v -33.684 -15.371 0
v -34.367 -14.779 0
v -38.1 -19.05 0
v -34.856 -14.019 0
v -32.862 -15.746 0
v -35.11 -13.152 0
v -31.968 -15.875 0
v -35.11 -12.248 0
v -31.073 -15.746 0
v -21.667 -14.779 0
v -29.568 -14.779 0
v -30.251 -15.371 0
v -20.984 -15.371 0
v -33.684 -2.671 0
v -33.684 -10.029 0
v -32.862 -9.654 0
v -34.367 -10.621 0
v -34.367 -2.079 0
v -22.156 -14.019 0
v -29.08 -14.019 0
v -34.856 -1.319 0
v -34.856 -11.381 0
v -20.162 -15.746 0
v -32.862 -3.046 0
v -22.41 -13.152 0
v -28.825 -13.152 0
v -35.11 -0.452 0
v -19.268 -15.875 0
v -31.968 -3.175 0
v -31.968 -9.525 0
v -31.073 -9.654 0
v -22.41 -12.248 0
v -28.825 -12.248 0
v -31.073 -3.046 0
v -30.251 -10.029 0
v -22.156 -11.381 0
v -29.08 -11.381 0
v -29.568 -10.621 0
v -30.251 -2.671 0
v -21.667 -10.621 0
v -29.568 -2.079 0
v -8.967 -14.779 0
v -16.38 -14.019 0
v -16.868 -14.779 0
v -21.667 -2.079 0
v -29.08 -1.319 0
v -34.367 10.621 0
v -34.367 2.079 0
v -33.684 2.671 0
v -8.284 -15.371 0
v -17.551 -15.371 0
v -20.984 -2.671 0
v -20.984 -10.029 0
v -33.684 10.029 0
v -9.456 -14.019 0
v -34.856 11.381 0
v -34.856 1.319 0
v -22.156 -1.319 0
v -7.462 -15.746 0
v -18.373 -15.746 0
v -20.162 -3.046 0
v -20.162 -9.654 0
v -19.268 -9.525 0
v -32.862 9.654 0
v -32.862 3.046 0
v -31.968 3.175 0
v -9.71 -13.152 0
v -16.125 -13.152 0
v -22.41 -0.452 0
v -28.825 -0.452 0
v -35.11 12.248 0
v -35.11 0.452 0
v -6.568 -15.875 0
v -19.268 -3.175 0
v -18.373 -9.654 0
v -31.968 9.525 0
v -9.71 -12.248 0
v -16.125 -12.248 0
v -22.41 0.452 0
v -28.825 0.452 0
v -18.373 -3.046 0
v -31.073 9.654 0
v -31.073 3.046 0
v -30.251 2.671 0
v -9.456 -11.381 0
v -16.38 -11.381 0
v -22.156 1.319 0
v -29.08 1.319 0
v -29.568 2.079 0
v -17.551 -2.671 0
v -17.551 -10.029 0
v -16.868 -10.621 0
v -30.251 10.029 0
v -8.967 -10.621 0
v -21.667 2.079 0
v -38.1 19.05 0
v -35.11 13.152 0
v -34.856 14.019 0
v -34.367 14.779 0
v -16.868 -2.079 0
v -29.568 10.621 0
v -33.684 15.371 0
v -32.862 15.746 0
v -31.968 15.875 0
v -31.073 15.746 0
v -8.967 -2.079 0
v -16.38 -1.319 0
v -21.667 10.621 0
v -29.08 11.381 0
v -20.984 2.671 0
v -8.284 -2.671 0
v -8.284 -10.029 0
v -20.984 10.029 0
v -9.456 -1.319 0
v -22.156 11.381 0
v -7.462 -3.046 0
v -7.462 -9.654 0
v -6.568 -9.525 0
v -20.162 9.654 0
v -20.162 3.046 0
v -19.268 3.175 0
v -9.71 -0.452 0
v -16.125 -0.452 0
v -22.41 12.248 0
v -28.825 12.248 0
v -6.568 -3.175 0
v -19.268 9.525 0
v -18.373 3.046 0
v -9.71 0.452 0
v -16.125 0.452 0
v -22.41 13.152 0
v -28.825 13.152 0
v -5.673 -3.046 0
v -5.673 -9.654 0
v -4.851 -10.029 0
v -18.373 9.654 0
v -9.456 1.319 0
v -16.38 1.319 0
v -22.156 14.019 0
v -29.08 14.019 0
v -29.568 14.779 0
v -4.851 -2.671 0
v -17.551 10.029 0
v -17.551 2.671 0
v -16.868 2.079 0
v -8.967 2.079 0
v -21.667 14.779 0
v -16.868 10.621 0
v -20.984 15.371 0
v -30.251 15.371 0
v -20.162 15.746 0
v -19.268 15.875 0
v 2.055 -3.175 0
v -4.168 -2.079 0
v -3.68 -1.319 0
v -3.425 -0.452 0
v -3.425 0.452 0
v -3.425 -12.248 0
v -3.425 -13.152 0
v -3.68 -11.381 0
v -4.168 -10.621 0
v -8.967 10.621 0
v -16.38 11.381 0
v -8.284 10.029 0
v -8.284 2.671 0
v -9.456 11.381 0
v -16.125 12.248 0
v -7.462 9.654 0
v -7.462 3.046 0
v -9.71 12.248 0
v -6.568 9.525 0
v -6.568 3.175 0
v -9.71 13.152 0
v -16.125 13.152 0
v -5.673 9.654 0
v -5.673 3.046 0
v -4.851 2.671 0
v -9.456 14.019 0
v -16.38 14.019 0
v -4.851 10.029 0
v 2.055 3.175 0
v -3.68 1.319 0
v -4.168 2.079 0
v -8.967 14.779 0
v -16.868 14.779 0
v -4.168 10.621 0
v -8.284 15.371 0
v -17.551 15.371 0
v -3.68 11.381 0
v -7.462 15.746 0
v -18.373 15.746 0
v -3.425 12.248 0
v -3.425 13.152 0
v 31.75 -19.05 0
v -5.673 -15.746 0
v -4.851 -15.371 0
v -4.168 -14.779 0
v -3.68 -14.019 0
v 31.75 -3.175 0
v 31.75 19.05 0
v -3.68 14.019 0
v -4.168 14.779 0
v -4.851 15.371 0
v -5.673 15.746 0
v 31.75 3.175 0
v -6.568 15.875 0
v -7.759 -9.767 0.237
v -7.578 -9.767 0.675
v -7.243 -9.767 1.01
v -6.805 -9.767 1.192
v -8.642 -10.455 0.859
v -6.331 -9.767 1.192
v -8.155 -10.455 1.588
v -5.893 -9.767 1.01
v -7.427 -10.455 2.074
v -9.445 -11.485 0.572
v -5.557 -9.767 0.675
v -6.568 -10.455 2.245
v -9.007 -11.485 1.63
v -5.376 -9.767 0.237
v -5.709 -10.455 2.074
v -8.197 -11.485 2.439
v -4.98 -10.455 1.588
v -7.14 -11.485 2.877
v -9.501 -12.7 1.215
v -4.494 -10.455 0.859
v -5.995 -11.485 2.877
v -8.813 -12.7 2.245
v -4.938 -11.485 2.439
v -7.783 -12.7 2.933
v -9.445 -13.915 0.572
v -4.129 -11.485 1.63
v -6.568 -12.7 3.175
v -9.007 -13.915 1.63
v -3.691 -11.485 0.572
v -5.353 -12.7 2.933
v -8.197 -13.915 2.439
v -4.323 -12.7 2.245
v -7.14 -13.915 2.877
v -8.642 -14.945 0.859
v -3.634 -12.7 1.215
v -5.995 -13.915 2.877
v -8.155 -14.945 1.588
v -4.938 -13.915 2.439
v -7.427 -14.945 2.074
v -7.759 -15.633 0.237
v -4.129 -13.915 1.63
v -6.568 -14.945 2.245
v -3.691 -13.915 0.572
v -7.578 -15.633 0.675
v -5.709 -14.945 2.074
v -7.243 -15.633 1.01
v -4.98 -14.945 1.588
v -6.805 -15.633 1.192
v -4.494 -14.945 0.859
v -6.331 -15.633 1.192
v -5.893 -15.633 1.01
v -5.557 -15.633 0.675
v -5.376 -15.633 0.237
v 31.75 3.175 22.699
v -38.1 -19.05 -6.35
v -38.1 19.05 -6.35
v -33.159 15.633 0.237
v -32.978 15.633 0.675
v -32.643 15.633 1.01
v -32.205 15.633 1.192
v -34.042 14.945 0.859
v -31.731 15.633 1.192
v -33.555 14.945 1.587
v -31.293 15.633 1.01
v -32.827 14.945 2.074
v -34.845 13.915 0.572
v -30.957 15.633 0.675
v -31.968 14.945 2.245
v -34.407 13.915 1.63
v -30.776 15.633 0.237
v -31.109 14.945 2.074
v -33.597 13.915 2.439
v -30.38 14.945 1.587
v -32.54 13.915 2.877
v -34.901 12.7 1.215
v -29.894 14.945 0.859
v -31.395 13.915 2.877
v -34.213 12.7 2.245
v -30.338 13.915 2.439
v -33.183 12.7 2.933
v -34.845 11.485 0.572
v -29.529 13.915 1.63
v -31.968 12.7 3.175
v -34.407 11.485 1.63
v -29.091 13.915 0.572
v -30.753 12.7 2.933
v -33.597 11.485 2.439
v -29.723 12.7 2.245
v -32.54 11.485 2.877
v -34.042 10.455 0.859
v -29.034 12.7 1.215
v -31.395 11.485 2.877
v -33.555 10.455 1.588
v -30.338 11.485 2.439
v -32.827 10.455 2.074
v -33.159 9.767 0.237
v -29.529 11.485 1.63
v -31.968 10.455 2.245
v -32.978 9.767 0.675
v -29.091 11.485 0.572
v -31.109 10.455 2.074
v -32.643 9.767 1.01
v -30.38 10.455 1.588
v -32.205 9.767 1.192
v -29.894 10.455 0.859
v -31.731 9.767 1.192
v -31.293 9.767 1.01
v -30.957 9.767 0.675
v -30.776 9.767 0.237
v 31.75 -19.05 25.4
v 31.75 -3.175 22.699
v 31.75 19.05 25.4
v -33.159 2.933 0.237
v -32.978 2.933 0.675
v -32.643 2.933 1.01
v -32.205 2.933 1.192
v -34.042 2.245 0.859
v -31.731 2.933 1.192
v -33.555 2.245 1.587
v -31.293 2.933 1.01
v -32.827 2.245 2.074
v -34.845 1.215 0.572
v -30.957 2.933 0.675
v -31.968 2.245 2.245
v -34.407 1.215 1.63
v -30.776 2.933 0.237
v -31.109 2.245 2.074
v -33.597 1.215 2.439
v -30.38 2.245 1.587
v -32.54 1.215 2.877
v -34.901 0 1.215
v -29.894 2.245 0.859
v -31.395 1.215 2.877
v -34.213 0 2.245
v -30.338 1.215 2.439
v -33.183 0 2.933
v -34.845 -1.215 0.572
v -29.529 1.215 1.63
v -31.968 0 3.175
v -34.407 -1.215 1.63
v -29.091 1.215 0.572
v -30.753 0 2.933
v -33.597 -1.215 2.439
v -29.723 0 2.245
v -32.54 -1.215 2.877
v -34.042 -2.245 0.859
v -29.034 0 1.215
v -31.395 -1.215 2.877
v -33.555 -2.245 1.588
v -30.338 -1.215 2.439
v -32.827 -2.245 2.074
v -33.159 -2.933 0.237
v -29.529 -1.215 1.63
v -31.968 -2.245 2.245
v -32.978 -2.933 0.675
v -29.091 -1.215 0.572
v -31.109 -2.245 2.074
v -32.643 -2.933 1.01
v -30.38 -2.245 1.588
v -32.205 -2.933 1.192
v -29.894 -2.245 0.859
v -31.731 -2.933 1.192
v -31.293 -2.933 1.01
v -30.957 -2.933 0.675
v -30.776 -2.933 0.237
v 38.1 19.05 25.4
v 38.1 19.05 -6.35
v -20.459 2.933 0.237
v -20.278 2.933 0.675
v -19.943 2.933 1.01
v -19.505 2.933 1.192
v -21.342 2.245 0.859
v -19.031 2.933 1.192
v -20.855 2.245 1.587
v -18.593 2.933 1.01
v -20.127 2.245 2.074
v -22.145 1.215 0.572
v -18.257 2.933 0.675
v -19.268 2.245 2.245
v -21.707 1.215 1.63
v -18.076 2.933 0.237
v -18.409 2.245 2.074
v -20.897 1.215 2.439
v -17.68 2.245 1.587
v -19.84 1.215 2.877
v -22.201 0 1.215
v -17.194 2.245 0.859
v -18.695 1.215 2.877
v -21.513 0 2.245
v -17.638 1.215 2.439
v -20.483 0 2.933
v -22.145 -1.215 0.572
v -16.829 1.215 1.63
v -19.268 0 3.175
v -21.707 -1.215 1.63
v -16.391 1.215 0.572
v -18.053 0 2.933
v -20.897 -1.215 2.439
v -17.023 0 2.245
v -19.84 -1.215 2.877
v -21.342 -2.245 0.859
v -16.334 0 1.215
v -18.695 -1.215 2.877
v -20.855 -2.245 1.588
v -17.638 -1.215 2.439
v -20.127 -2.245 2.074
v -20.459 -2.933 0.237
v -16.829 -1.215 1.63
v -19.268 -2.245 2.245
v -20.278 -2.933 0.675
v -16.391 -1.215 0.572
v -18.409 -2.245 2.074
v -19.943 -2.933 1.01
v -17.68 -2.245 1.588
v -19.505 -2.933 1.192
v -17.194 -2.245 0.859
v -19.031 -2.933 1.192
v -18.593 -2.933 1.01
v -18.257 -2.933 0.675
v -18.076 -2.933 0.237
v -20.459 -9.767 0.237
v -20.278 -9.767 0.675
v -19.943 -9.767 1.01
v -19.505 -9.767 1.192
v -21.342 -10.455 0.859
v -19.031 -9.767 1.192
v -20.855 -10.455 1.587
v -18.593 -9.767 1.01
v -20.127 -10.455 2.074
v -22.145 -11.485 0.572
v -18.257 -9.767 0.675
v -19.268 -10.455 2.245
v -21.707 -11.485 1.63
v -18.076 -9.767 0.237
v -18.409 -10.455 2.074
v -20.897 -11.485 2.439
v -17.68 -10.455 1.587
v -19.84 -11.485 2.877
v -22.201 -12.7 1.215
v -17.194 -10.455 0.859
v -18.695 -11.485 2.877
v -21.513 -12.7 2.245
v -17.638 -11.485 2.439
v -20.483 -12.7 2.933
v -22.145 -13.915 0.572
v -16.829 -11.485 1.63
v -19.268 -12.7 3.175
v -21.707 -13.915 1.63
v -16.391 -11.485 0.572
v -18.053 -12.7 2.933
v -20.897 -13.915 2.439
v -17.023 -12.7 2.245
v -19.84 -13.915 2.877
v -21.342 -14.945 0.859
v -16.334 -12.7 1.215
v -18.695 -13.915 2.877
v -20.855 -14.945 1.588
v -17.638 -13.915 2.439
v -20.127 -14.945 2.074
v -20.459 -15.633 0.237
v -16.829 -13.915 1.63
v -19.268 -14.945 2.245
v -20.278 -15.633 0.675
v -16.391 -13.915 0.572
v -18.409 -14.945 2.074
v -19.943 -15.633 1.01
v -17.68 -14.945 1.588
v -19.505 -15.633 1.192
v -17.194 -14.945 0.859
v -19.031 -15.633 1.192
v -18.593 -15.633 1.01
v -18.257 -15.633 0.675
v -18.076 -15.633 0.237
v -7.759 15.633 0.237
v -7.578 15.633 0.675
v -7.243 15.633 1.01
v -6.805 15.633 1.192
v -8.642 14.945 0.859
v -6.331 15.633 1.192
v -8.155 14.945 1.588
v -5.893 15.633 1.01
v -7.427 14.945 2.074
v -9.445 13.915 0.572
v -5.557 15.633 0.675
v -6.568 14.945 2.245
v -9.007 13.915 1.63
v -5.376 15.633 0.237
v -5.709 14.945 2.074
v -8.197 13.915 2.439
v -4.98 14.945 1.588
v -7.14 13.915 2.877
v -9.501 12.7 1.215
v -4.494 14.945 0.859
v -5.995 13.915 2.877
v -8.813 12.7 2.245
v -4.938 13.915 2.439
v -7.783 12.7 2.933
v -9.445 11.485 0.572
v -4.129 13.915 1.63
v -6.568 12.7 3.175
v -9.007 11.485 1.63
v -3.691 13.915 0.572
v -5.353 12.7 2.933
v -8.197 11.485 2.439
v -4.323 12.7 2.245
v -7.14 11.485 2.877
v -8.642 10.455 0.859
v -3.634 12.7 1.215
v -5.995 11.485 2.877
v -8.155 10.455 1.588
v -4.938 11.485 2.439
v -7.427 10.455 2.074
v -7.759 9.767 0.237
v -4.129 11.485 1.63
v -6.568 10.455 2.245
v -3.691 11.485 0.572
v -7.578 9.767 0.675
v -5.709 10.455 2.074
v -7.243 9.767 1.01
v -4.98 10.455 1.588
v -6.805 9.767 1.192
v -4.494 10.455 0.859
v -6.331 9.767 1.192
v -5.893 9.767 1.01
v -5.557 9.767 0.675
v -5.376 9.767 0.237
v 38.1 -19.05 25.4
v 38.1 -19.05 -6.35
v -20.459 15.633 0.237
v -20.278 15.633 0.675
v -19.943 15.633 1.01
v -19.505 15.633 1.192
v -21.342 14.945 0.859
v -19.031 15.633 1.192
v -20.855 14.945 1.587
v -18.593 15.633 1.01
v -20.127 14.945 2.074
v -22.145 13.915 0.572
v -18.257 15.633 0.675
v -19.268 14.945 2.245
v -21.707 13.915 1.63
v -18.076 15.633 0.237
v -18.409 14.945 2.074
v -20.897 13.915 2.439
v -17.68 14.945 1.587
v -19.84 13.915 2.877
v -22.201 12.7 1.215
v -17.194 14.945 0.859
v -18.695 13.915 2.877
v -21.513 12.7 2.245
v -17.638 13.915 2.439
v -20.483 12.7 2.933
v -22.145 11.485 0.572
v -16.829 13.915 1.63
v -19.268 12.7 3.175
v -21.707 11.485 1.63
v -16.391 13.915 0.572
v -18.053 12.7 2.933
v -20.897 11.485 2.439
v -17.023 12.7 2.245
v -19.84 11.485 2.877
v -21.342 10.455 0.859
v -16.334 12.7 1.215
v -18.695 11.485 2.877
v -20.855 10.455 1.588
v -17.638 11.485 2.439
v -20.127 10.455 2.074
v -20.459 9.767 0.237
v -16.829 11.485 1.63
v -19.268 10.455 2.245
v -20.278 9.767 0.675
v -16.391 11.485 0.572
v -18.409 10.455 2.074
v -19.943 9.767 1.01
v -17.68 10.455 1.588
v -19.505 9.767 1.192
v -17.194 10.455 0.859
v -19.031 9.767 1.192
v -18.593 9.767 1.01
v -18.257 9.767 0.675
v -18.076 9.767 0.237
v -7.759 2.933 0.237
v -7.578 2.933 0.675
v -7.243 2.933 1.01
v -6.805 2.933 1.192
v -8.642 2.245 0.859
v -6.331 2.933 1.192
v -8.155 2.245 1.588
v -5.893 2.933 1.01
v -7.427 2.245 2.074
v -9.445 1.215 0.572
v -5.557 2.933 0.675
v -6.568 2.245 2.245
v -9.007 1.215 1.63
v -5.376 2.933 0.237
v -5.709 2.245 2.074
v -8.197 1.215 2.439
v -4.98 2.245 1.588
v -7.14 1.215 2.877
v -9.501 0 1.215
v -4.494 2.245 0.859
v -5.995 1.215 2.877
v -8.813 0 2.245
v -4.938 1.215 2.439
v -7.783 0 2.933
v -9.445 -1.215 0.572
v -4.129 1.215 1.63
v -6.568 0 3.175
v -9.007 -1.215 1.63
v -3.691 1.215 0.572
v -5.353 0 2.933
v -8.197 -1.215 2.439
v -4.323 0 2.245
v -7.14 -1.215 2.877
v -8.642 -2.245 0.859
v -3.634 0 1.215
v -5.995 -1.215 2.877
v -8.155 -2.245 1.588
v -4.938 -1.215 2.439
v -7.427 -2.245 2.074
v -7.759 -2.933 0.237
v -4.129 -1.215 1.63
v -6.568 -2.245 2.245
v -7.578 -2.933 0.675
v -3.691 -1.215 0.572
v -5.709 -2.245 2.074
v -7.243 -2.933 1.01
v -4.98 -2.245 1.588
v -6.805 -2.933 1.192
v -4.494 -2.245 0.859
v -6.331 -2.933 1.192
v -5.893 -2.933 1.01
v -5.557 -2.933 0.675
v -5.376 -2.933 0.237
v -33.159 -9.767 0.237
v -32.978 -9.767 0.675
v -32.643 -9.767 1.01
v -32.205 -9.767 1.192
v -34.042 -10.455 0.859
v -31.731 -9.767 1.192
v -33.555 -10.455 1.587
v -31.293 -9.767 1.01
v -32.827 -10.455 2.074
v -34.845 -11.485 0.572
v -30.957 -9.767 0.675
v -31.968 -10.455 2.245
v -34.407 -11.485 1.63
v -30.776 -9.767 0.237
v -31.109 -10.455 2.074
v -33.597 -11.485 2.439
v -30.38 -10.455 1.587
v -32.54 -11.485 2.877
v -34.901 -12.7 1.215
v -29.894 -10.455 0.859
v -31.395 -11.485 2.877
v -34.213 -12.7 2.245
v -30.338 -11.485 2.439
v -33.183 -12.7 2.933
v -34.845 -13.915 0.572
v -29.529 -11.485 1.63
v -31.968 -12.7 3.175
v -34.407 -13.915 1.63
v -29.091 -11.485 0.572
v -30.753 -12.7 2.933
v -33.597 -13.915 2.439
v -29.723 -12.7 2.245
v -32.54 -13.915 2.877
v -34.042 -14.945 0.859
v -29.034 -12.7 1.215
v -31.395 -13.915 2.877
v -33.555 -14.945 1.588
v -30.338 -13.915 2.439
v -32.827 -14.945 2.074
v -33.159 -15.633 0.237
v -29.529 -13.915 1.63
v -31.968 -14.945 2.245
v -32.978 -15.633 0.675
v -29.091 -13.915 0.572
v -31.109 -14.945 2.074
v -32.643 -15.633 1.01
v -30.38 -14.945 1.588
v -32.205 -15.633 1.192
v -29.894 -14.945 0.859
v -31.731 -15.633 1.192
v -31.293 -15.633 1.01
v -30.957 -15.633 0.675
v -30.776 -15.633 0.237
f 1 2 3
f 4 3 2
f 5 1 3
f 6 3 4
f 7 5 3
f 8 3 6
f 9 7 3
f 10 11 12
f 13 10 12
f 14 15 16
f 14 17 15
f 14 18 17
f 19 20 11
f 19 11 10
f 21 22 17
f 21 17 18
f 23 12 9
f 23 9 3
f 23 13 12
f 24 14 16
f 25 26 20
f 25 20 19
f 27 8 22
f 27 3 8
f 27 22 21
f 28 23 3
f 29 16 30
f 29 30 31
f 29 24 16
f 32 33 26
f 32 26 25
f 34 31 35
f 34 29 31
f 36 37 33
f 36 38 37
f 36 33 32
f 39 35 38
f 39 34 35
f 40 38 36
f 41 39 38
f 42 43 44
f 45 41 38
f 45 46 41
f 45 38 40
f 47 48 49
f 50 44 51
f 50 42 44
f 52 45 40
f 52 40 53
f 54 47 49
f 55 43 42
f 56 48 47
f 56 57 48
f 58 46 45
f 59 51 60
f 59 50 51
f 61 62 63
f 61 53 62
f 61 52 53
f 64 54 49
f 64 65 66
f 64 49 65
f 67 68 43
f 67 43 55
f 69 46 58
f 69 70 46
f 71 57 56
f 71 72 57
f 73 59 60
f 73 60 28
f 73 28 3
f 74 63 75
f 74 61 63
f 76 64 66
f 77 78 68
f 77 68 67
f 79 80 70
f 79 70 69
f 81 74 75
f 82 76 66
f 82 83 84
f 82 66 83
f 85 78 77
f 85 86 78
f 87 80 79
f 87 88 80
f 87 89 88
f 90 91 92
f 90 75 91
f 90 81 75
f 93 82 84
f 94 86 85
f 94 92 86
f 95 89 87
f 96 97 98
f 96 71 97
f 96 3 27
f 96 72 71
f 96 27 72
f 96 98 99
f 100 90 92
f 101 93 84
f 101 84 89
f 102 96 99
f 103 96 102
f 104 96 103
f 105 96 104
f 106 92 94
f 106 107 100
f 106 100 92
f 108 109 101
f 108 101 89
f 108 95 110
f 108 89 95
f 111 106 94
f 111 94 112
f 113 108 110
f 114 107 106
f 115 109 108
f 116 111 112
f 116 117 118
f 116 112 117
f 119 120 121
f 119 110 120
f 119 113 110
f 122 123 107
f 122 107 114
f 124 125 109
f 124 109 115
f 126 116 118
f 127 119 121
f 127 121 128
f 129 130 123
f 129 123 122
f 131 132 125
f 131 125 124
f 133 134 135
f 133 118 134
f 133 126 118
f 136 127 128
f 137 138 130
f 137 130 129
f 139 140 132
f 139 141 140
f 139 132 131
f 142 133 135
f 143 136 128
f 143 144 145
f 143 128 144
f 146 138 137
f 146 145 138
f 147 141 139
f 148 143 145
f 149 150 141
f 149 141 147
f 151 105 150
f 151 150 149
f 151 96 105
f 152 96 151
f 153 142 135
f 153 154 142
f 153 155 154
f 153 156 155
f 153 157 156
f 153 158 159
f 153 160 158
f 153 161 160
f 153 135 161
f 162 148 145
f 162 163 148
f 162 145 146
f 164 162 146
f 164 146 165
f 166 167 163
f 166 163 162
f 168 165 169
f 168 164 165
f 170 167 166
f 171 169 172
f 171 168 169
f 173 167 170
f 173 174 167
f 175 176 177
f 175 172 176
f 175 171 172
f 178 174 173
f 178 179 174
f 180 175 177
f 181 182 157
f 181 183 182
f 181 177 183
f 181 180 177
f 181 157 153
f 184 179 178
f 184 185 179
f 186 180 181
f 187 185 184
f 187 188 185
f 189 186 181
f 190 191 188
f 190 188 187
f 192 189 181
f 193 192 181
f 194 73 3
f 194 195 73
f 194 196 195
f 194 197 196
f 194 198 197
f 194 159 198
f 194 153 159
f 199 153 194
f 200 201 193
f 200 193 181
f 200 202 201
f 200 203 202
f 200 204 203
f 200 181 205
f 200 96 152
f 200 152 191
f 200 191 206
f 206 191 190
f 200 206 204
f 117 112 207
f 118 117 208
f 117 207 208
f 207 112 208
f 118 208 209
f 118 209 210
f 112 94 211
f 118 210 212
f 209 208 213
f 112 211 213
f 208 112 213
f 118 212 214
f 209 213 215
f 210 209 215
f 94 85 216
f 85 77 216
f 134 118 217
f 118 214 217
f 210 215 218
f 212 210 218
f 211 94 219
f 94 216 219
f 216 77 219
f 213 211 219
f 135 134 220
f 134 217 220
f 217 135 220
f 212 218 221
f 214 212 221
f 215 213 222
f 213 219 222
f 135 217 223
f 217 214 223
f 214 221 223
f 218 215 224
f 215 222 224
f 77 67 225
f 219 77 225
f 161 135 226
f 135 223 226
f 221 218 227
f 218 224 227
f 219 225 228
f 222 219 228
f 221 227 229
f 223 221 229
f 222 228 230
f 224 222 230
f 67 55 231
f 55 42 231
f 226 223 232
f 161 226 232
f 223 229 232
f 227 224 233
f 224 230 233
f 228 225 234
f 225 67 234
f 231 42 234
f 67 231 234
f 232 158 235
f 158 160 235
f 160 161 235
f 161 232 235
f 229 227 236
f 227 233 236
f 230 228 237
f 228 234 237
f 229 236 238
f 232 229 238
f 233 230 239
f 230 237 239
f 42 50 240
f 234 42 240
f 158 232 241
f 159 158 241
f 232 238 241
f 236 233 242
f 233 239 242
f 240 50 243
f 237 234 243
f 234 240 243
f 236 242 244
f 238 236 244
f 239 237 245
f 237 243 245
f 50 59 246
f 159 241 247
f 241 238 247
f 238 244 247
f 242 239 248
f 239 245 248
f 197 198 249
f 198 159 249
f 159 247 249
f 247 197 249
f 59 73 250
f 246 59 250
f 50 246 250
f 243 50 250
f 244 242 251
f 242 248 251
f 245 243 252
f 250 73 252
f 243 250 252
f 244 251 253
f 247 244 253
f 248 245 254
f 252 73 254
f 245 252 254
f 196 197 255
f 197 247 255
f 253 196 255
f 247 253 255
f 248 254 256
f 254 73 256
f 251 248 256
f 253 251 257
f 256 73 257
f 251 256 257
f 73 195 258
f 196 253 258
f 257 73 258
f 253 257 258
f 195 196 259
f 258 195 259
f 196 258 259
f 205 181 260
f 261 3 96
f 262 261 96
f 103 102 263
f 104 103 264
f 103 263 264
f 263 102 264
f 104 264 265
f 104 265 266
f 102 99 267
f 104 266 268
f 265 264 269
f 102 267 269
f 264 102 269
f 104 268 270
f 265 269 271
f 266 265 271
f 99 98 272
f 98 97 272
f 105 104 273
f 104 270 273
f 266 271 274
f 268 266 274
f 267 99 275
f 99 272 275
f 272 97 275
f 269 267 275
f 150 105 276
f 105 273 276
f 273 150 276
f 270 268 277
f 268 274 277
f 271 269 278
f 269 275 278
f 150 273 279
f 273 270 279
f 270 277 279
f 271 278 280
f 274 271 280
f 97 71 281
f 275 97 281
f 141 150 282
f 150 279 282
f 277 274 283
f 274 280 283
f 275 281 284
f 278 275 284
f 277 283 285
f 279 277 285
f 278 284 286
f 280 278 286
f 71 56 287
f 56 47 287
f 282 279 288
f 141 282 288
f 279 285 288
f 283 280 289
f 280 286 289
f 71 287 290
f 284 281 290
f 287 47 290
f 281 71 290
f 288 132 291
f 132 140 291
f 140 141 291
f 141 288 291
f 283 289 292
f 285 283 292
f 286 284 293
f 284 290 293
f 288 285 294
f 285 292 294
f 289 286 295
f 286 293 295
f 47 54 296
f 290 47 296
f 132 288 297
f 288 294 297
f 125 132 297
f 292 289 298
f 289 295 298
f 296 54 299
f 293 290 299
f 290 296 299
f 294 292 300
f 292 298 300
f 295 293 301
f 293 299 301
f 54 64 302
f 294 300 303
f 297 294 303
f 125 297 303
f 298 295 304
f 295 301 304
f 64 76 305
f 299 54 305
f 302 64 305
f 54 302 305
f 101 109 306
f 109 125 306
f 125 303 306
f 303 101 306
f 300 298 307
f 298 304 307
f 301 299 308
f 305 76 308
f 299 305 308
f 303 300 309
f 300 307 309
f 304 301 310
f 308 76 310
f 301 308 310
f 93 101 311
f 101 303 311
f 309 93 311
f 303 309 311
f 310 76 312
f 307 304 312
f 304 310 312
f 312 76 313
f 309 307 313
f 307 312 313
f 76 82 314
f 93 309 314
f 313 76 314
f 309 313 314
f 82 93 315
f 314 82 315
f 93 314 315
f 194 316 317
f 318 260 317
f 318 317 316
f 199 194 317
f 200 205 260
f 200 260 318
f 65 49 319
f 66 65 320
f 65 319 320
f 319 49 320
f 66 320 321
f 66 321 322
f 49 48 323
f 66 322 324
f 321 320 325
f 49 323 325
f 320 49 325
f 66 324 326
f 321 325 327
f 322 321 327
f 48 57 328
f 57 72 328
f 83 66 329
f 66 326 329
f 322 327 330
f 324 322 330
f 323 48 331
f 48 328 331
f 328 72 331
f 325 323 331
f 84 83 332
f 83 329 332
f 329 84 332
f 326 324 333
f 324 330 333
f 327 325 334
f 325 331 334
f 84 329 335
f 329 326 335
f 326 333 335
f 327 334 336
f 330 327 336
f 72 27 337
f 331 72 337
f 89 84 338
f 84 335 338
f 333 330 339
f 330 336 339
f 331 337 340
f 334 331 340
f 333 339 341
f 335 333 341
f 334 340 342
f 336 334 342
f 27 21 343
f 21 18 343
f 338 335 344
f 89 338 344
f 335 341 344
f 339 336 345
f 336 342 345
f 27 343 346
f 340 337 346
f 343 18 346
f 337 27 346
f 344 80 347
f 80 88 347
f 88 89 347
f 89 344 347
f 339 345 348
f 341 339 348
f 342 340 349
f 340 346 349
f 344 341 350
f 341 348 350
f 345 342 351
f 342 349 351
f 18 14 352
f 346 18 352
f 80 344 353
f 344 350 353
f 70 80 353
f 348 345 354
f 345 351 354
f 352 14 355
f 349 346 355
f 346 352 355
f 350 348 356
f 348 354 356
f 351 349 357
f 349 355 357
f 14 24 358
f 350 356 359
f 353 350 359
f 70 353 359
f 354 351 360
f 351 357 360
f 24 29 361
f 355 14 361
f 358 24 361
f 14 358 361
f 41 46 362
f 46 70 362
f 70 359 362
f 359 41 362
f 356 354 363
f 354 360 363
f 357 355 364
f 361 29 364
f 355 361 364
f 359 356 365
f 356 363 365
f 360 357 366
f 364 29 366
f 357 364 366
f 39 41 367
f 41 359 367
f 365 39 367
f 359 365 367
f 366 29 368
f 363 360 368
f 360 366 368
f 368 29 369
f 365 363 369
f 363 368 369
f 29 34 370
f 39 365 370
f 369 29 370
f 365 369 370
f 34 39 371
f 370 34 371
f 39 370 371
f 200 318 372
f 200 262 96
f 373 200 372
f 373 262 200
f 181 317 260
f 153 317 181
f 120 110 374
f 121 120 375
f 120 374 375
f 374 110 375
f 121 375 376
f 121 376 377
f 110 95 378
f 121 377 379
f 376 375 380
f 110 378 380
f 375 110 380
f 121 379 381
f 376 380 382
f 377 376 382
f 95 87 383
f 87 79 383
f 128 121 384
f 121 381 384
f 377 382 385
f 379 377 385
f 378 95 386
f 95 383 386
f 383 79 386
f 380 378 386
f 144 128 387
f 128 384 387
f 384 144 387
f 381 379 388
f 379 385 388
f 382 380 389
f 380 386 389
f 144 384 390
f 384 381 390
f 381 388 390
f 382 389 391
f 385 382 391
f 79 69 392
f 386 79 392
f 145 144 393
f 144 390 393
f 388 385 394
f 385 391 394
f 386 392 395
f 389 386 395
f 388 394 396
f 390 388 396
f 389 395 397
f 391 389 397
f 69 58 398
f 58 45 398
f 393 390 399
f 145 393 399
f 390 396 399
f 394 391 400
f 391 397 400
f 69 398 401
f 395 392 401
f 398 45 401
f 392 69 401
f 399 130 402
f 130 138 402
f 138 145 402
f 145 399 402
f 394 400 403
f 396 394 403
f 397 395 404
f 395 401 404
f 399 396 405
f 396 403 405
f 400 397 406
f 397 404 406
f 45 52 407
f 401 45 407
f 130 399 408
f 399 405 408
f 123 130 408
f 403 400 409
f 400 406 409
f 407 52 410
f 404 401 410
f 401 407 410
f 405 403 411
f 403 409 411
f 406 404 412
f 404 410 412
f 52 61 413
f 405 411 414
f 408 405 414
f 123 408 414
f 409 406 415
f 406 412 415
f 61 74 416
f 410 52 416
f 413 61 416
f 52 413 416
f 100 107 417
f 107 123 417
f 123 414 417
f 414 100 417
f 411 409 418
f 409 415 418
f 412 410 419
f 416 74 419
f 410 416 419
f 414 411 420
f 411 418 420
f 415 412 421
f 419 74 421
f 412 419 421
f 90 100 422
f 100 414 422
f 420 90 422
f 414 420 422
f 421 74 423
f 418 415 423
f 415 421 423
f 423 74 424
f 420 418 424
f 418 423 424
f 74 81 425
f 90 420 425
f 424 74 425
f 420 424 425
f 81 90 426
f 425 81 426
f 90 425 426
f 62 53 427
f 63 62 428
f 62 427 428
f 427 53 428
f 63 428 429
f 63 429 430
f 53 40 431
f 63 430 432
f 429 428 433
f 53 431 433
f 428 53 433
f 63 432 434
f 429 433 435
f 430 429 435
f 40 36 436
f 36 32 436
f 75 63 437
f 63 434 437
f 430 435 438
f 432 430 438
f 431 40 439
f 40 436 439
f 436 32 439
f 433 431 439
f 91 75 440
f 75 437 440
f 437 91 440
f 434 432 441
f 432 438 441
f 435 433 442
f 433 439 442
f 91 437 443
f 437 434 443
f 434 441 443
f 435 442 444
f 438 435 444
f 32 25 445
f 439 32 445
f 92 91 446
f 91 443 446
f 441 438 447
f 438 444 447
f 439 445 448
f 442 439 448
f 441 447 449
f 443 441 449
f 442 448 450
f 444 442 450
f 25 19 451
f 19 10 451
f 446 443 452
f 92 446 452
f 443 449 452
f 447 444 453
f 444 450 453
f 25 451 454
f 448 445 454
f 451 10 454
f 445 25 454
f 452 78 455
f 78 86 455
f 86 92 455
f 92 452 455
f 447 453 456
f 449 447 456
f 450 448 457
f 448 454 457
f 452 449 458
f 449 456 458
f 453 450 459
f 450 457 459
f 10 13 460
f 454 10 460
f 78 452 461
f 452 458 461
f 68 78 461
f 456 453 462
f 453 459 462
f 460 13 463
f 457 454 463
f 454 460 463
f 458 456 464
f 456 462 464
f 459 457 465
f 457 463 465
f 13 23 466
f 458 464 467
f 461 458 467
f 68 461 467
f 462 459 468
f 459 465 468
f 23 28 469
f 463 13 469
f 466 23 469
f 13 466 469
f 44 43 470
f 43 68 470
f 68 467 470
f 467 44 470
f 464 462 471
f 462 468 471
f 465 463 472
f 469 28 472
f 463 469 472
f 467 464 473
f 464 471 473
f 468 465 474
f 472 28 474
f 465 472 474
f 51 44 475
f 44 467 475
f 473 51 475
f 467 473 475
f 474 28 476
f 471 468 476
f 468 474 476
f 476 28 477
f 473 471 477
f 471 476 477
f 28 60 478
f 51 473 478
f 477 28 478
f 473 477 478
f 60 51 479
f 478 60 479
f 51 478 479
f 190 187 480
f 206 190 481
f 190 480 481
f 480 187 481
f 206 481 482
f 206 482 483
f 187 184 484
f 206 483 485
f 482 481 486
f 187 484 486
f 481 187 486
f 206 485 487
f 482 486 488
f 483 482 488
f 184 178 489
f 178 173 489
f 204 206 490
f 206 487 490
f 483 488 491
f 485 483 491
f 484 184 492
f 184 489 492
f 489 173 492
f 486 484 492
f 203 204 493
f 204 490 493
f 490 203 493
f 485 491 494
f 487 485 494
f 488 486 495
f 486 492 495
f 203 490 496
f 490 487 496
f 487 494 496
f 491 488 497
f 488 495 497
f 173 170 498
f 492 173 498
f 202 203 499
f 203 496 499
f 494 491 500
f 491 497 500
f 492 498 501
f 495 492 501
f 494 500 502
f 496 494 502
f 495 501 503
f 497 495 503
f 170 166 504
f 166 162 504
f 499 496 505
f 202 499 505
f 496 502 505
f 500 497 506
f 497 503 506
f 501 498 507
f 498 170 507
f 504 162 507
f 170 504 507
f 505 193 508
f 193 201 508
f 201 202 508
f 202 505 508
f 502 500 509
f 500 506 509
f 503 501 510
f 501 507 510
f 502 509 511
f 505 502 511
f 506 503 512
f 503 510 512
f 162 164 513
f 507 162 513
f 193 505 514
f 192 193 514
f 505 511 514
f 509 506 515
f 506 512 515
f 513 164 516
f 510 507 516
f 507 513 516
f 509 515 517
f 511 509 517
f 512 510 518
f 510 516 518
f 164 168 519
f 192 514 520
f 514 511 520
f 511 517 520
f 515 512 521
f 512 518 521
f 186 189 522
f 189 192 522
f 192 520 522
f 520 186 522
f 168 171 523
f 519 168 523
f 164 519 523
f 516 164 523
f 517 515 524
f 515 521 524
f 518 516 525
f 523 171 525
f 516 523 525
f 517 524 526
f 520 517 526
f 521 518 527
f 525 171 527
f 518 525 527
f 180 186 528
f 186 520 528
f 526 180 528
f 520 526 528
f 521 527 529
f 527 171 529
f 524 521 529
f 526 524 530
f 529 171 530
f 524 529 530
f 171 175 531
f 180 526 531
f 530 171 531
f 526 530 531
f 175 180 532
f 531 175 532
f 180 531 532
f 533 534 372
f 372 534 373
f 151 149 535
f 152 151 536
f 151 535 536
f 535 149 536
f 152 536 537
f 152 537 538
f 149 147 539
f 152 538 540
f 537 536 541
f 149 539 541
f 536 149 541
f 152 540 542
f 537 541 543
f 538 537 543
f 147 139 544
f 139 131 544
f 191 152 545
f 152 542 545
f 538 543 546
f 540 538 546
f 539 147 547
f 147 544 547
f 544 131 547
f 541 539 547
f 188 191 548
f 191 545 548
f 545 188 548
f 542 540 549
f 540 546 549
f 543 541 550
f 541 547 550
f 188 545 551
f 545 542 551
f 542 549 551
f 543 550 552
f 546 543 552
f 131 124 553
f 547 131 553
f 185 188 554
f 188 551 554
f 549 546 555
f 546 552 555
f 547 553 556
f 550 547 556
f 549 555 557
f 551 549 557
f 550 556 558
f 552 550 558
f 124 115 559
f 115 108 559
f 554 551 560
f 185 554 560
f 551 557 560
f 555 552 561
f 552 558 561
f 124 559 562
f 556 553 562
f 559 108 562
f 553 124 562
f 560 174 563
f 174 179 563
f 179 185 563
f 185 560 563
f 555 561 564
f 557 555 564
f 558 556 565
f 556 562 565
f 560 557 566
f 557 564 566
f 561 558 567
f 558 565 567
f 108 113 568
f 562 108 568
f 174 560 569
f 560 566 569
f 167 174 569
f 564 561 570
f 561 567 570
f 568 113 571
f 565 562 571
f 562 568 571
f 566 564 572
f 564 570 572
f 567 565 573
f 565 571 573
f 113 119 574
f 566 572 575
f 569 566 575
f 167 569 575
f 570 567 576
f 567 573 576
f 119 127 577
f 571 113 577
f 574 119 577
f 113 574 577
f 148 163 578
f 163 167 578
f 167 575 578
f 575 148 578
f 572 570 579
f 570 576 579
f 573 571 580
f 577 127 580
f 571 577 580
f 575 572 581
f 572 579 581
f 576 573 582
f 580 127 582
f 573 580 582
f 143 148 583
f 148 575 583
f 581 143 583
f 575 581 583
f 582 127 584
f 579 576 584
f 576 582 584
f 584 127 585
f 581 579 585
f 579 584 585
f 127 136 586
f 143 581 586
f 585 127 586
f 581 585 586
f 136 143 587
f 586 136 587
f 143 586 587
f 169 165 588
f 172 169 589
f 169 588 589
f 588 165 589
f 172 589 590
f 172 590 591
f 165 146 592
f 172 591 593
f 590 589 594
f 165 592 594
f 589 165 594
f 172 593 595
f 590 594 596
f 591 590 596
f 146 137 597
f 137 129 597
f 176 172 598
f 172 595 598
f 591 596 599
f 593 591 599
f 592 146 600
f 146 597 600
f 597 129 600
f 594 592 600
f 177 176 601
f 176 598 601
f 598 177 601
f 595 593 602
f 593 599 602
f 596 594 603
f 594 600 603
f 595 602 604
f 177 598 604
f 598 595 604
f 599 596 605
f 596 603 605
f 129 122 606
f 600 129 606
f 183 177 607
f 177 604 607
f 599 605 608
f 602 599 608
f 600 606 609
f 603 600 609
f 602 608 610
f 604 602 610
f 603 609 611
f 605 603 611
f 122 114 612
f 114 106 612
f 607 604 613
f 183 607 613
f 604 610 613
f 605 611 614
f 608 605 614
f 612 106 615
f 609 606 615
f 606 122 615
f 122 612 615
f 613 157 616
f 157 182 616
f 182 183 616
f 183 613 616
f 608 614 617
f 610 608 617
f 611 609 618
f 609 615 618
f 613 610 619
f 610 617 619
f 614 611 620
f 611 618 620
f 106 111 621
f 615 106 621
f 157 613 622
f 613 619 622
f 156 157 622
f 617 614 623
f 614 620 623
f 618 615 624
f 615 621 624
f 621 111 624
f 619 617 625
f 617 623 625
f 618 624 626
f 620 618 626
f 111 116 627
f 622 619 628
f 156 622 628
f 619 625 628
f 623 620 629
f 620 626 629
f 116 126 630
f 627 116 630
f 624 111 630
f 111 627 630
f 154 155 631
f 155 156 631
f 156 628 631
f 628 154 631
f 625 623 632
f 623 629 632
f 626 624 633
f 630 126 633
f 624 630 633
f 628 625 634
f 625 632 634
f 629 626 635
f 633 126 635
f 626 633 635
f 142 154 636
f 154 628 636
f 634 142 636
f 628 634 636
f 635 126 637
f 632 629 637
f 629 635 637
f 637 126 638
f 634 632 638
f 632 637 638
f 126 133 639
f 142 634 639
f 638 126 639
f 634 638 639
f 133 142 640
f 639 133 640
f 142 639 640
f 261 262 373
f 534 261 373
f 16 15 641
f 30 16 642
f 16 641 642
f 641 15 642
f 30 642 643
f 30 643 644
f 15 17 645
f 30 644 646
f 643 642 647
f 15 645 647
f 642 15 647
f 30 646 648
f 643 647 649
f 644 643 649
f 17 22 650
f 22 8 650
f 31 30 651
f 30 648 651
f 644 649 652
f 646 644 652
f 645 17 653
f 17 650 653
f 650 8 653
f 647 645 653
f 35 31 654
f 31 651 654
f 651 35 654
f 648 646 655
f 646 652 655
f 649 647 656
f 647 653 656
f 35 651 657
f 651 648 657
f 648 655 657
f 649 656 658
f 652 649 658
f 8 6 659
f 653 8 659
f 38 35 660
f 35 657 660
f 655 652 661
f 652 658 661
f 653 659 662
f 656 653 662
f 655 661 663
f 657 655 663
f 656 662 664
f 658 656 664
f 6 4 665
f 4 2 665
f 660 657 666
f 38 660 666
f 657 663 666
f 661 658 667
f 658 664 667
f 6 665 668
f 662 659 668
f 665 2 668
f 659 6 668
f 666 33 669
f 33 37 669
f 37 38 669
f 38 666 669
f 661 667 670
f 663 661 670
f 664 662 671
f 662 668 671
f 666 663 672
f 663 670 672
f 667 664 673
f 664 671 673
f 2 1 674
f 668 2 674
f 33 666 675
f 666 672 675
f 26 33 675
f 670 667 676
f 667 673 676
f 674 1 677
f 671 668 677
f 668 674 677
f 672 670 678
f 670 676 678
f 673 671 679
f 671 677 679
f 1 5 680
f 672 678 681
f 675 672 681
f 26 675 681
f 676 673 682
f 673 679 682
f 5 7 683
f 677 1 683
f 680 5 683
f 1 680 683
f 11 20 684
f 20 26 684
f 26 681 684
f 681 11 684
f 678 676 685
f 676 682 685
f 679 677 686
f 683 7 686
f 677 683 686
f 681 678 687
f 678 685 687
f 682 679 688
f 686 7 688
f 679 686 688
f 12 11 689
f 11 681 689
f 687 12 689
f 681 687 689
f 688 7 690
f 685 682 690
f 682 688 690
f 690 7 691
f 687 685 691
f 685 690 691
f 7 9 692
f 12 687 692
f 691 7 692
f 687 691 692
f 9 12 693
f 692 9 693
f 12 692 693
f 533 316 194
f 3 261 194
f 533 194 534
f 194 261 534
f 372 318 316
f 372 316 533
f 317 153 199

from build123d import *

# Parameters (mm, degrees)
F0_W     = 76.2
F0_H     = 38.1
F1_DEPTH = 6.35
F6_W     = 6.35
F6_H     = 38.1
F7_DEPTH = 25.4
F9_DEPTH = 3.175


with BuildPart() as f1:
    # F0 (on Top) → F1 (new body)
    with BuildSketch(Plane.XY):
        Rectangle(F0_W, F0_H)
    extrude(amount=-F1_DEPTH)

    # F2 (on face) → F3 (revolve)
    with BuildSketch(Plane.XY):
        with BuildLine():
            Line((-31.9676950246, 9.525), (-31.9676950246, 15.875))
            ThreePointArc((-31.9676950246, 15.875), (-35.1426950246, 12.7), (-31.9676950246, 9.525))
        make_face()
        with BuildLine():
            Line((-31.9676950246, -3.175), (-31.9676950246, 3.175))
            ThreePointArc((-31.9676950246, 3.175), (-35.1426950246, 0), (-31.9676950246, -3.175))
        make_face()
        with BuildLine():
            Line((-31.9676950246, -15.875), (-31.9676950246, -9.525))
            ThreePointArc((-31.9676950246, -9.525), (-35.1426950246, -12.7), (-31.9676950246, -15.875))
        make_face()
    revolve(axis=Axis((-31.9676950246, 0, 0), (0, 1, 0)))

    # F2 (on face) → F4 (revolve)
    with BuildSketch(Plane.XY):
        with BuildLine():
            Line((-19.2676950246, 9.525), (-19.2676950246, 15.875))
            ThreePointArc((-19.2676950246, 15.875), (-22.4426950246, 12.7), (-19.2676950246, 9.525))
        make_face()
        with BuildLine():
            Line((-19.2676950246, -3.175), (-19.2676950246, 3.175))
            ThreePointArc((-19.2676950246, 3.175), (-22.4426950246, 0), (-19.2676950246, -3.175))
        make_face()
        with BuildLine():
            Line((-19.2676950246, -15.875), (-19.2676950246, -9.525))
            ThreePointArc((-19.2676950246, -9.525), (-22.4426950246, -12.7), (-19.2676950246, -15.875))
        make_face()
    revolve(axis=Axis((-19.2676950246, 0, 0), (0, 1, 0)))

    # F2 (on face) → F5 (revolve)
    with BuildSketch(Plane.XY):
        with BuildLine():
            Line((-6.5676950246, 9.525), (-6.5676950246, 15.875))
            ThreePointArc((-6.5676950246, 15.875), (-9.7426950246, 12.7), (-6.5676950246, 9.525))
        make_face()
        with BuildLine():
            Line((-6.5676950246, -3.175), (-6.5676950246, 3.175))
            ThreePointArc((-6.5676950246, 3.175), (-9.7426950246, 0), (-6.5676950246, -3.175))
        make_face()
        with BuildLine():
            Line((-6.5676950246, -15.875), (-6.5676950246, -9.525))
            ThreePointArc((-6.5676950246, -9.525), (-9.7426950246, -12.7), (-6.5676950246, -15.875))
        make_face()
    revolve(axis=Axis((-6.5676950246, -12.7, 0), (0, 1, 0)))

    # F6 (on face) → F7 (join)
    with BuildSketch(Plane.XY):
        with Locations((34.925, 0)):
            Rectangle(F6_W, F6_H)
    extrude(amount=F7_DEPTH)

    # F8 (on Front) → F9 (join, symmetric)
    with BuildSketch(Plane.XZ):
        Polygon((31.75, 0), (31.75, 22.6986259222), (2.0545818843, 0), align=None)
    extrude(amount=F9_DEPTH, both=True)


solid = f1.part
